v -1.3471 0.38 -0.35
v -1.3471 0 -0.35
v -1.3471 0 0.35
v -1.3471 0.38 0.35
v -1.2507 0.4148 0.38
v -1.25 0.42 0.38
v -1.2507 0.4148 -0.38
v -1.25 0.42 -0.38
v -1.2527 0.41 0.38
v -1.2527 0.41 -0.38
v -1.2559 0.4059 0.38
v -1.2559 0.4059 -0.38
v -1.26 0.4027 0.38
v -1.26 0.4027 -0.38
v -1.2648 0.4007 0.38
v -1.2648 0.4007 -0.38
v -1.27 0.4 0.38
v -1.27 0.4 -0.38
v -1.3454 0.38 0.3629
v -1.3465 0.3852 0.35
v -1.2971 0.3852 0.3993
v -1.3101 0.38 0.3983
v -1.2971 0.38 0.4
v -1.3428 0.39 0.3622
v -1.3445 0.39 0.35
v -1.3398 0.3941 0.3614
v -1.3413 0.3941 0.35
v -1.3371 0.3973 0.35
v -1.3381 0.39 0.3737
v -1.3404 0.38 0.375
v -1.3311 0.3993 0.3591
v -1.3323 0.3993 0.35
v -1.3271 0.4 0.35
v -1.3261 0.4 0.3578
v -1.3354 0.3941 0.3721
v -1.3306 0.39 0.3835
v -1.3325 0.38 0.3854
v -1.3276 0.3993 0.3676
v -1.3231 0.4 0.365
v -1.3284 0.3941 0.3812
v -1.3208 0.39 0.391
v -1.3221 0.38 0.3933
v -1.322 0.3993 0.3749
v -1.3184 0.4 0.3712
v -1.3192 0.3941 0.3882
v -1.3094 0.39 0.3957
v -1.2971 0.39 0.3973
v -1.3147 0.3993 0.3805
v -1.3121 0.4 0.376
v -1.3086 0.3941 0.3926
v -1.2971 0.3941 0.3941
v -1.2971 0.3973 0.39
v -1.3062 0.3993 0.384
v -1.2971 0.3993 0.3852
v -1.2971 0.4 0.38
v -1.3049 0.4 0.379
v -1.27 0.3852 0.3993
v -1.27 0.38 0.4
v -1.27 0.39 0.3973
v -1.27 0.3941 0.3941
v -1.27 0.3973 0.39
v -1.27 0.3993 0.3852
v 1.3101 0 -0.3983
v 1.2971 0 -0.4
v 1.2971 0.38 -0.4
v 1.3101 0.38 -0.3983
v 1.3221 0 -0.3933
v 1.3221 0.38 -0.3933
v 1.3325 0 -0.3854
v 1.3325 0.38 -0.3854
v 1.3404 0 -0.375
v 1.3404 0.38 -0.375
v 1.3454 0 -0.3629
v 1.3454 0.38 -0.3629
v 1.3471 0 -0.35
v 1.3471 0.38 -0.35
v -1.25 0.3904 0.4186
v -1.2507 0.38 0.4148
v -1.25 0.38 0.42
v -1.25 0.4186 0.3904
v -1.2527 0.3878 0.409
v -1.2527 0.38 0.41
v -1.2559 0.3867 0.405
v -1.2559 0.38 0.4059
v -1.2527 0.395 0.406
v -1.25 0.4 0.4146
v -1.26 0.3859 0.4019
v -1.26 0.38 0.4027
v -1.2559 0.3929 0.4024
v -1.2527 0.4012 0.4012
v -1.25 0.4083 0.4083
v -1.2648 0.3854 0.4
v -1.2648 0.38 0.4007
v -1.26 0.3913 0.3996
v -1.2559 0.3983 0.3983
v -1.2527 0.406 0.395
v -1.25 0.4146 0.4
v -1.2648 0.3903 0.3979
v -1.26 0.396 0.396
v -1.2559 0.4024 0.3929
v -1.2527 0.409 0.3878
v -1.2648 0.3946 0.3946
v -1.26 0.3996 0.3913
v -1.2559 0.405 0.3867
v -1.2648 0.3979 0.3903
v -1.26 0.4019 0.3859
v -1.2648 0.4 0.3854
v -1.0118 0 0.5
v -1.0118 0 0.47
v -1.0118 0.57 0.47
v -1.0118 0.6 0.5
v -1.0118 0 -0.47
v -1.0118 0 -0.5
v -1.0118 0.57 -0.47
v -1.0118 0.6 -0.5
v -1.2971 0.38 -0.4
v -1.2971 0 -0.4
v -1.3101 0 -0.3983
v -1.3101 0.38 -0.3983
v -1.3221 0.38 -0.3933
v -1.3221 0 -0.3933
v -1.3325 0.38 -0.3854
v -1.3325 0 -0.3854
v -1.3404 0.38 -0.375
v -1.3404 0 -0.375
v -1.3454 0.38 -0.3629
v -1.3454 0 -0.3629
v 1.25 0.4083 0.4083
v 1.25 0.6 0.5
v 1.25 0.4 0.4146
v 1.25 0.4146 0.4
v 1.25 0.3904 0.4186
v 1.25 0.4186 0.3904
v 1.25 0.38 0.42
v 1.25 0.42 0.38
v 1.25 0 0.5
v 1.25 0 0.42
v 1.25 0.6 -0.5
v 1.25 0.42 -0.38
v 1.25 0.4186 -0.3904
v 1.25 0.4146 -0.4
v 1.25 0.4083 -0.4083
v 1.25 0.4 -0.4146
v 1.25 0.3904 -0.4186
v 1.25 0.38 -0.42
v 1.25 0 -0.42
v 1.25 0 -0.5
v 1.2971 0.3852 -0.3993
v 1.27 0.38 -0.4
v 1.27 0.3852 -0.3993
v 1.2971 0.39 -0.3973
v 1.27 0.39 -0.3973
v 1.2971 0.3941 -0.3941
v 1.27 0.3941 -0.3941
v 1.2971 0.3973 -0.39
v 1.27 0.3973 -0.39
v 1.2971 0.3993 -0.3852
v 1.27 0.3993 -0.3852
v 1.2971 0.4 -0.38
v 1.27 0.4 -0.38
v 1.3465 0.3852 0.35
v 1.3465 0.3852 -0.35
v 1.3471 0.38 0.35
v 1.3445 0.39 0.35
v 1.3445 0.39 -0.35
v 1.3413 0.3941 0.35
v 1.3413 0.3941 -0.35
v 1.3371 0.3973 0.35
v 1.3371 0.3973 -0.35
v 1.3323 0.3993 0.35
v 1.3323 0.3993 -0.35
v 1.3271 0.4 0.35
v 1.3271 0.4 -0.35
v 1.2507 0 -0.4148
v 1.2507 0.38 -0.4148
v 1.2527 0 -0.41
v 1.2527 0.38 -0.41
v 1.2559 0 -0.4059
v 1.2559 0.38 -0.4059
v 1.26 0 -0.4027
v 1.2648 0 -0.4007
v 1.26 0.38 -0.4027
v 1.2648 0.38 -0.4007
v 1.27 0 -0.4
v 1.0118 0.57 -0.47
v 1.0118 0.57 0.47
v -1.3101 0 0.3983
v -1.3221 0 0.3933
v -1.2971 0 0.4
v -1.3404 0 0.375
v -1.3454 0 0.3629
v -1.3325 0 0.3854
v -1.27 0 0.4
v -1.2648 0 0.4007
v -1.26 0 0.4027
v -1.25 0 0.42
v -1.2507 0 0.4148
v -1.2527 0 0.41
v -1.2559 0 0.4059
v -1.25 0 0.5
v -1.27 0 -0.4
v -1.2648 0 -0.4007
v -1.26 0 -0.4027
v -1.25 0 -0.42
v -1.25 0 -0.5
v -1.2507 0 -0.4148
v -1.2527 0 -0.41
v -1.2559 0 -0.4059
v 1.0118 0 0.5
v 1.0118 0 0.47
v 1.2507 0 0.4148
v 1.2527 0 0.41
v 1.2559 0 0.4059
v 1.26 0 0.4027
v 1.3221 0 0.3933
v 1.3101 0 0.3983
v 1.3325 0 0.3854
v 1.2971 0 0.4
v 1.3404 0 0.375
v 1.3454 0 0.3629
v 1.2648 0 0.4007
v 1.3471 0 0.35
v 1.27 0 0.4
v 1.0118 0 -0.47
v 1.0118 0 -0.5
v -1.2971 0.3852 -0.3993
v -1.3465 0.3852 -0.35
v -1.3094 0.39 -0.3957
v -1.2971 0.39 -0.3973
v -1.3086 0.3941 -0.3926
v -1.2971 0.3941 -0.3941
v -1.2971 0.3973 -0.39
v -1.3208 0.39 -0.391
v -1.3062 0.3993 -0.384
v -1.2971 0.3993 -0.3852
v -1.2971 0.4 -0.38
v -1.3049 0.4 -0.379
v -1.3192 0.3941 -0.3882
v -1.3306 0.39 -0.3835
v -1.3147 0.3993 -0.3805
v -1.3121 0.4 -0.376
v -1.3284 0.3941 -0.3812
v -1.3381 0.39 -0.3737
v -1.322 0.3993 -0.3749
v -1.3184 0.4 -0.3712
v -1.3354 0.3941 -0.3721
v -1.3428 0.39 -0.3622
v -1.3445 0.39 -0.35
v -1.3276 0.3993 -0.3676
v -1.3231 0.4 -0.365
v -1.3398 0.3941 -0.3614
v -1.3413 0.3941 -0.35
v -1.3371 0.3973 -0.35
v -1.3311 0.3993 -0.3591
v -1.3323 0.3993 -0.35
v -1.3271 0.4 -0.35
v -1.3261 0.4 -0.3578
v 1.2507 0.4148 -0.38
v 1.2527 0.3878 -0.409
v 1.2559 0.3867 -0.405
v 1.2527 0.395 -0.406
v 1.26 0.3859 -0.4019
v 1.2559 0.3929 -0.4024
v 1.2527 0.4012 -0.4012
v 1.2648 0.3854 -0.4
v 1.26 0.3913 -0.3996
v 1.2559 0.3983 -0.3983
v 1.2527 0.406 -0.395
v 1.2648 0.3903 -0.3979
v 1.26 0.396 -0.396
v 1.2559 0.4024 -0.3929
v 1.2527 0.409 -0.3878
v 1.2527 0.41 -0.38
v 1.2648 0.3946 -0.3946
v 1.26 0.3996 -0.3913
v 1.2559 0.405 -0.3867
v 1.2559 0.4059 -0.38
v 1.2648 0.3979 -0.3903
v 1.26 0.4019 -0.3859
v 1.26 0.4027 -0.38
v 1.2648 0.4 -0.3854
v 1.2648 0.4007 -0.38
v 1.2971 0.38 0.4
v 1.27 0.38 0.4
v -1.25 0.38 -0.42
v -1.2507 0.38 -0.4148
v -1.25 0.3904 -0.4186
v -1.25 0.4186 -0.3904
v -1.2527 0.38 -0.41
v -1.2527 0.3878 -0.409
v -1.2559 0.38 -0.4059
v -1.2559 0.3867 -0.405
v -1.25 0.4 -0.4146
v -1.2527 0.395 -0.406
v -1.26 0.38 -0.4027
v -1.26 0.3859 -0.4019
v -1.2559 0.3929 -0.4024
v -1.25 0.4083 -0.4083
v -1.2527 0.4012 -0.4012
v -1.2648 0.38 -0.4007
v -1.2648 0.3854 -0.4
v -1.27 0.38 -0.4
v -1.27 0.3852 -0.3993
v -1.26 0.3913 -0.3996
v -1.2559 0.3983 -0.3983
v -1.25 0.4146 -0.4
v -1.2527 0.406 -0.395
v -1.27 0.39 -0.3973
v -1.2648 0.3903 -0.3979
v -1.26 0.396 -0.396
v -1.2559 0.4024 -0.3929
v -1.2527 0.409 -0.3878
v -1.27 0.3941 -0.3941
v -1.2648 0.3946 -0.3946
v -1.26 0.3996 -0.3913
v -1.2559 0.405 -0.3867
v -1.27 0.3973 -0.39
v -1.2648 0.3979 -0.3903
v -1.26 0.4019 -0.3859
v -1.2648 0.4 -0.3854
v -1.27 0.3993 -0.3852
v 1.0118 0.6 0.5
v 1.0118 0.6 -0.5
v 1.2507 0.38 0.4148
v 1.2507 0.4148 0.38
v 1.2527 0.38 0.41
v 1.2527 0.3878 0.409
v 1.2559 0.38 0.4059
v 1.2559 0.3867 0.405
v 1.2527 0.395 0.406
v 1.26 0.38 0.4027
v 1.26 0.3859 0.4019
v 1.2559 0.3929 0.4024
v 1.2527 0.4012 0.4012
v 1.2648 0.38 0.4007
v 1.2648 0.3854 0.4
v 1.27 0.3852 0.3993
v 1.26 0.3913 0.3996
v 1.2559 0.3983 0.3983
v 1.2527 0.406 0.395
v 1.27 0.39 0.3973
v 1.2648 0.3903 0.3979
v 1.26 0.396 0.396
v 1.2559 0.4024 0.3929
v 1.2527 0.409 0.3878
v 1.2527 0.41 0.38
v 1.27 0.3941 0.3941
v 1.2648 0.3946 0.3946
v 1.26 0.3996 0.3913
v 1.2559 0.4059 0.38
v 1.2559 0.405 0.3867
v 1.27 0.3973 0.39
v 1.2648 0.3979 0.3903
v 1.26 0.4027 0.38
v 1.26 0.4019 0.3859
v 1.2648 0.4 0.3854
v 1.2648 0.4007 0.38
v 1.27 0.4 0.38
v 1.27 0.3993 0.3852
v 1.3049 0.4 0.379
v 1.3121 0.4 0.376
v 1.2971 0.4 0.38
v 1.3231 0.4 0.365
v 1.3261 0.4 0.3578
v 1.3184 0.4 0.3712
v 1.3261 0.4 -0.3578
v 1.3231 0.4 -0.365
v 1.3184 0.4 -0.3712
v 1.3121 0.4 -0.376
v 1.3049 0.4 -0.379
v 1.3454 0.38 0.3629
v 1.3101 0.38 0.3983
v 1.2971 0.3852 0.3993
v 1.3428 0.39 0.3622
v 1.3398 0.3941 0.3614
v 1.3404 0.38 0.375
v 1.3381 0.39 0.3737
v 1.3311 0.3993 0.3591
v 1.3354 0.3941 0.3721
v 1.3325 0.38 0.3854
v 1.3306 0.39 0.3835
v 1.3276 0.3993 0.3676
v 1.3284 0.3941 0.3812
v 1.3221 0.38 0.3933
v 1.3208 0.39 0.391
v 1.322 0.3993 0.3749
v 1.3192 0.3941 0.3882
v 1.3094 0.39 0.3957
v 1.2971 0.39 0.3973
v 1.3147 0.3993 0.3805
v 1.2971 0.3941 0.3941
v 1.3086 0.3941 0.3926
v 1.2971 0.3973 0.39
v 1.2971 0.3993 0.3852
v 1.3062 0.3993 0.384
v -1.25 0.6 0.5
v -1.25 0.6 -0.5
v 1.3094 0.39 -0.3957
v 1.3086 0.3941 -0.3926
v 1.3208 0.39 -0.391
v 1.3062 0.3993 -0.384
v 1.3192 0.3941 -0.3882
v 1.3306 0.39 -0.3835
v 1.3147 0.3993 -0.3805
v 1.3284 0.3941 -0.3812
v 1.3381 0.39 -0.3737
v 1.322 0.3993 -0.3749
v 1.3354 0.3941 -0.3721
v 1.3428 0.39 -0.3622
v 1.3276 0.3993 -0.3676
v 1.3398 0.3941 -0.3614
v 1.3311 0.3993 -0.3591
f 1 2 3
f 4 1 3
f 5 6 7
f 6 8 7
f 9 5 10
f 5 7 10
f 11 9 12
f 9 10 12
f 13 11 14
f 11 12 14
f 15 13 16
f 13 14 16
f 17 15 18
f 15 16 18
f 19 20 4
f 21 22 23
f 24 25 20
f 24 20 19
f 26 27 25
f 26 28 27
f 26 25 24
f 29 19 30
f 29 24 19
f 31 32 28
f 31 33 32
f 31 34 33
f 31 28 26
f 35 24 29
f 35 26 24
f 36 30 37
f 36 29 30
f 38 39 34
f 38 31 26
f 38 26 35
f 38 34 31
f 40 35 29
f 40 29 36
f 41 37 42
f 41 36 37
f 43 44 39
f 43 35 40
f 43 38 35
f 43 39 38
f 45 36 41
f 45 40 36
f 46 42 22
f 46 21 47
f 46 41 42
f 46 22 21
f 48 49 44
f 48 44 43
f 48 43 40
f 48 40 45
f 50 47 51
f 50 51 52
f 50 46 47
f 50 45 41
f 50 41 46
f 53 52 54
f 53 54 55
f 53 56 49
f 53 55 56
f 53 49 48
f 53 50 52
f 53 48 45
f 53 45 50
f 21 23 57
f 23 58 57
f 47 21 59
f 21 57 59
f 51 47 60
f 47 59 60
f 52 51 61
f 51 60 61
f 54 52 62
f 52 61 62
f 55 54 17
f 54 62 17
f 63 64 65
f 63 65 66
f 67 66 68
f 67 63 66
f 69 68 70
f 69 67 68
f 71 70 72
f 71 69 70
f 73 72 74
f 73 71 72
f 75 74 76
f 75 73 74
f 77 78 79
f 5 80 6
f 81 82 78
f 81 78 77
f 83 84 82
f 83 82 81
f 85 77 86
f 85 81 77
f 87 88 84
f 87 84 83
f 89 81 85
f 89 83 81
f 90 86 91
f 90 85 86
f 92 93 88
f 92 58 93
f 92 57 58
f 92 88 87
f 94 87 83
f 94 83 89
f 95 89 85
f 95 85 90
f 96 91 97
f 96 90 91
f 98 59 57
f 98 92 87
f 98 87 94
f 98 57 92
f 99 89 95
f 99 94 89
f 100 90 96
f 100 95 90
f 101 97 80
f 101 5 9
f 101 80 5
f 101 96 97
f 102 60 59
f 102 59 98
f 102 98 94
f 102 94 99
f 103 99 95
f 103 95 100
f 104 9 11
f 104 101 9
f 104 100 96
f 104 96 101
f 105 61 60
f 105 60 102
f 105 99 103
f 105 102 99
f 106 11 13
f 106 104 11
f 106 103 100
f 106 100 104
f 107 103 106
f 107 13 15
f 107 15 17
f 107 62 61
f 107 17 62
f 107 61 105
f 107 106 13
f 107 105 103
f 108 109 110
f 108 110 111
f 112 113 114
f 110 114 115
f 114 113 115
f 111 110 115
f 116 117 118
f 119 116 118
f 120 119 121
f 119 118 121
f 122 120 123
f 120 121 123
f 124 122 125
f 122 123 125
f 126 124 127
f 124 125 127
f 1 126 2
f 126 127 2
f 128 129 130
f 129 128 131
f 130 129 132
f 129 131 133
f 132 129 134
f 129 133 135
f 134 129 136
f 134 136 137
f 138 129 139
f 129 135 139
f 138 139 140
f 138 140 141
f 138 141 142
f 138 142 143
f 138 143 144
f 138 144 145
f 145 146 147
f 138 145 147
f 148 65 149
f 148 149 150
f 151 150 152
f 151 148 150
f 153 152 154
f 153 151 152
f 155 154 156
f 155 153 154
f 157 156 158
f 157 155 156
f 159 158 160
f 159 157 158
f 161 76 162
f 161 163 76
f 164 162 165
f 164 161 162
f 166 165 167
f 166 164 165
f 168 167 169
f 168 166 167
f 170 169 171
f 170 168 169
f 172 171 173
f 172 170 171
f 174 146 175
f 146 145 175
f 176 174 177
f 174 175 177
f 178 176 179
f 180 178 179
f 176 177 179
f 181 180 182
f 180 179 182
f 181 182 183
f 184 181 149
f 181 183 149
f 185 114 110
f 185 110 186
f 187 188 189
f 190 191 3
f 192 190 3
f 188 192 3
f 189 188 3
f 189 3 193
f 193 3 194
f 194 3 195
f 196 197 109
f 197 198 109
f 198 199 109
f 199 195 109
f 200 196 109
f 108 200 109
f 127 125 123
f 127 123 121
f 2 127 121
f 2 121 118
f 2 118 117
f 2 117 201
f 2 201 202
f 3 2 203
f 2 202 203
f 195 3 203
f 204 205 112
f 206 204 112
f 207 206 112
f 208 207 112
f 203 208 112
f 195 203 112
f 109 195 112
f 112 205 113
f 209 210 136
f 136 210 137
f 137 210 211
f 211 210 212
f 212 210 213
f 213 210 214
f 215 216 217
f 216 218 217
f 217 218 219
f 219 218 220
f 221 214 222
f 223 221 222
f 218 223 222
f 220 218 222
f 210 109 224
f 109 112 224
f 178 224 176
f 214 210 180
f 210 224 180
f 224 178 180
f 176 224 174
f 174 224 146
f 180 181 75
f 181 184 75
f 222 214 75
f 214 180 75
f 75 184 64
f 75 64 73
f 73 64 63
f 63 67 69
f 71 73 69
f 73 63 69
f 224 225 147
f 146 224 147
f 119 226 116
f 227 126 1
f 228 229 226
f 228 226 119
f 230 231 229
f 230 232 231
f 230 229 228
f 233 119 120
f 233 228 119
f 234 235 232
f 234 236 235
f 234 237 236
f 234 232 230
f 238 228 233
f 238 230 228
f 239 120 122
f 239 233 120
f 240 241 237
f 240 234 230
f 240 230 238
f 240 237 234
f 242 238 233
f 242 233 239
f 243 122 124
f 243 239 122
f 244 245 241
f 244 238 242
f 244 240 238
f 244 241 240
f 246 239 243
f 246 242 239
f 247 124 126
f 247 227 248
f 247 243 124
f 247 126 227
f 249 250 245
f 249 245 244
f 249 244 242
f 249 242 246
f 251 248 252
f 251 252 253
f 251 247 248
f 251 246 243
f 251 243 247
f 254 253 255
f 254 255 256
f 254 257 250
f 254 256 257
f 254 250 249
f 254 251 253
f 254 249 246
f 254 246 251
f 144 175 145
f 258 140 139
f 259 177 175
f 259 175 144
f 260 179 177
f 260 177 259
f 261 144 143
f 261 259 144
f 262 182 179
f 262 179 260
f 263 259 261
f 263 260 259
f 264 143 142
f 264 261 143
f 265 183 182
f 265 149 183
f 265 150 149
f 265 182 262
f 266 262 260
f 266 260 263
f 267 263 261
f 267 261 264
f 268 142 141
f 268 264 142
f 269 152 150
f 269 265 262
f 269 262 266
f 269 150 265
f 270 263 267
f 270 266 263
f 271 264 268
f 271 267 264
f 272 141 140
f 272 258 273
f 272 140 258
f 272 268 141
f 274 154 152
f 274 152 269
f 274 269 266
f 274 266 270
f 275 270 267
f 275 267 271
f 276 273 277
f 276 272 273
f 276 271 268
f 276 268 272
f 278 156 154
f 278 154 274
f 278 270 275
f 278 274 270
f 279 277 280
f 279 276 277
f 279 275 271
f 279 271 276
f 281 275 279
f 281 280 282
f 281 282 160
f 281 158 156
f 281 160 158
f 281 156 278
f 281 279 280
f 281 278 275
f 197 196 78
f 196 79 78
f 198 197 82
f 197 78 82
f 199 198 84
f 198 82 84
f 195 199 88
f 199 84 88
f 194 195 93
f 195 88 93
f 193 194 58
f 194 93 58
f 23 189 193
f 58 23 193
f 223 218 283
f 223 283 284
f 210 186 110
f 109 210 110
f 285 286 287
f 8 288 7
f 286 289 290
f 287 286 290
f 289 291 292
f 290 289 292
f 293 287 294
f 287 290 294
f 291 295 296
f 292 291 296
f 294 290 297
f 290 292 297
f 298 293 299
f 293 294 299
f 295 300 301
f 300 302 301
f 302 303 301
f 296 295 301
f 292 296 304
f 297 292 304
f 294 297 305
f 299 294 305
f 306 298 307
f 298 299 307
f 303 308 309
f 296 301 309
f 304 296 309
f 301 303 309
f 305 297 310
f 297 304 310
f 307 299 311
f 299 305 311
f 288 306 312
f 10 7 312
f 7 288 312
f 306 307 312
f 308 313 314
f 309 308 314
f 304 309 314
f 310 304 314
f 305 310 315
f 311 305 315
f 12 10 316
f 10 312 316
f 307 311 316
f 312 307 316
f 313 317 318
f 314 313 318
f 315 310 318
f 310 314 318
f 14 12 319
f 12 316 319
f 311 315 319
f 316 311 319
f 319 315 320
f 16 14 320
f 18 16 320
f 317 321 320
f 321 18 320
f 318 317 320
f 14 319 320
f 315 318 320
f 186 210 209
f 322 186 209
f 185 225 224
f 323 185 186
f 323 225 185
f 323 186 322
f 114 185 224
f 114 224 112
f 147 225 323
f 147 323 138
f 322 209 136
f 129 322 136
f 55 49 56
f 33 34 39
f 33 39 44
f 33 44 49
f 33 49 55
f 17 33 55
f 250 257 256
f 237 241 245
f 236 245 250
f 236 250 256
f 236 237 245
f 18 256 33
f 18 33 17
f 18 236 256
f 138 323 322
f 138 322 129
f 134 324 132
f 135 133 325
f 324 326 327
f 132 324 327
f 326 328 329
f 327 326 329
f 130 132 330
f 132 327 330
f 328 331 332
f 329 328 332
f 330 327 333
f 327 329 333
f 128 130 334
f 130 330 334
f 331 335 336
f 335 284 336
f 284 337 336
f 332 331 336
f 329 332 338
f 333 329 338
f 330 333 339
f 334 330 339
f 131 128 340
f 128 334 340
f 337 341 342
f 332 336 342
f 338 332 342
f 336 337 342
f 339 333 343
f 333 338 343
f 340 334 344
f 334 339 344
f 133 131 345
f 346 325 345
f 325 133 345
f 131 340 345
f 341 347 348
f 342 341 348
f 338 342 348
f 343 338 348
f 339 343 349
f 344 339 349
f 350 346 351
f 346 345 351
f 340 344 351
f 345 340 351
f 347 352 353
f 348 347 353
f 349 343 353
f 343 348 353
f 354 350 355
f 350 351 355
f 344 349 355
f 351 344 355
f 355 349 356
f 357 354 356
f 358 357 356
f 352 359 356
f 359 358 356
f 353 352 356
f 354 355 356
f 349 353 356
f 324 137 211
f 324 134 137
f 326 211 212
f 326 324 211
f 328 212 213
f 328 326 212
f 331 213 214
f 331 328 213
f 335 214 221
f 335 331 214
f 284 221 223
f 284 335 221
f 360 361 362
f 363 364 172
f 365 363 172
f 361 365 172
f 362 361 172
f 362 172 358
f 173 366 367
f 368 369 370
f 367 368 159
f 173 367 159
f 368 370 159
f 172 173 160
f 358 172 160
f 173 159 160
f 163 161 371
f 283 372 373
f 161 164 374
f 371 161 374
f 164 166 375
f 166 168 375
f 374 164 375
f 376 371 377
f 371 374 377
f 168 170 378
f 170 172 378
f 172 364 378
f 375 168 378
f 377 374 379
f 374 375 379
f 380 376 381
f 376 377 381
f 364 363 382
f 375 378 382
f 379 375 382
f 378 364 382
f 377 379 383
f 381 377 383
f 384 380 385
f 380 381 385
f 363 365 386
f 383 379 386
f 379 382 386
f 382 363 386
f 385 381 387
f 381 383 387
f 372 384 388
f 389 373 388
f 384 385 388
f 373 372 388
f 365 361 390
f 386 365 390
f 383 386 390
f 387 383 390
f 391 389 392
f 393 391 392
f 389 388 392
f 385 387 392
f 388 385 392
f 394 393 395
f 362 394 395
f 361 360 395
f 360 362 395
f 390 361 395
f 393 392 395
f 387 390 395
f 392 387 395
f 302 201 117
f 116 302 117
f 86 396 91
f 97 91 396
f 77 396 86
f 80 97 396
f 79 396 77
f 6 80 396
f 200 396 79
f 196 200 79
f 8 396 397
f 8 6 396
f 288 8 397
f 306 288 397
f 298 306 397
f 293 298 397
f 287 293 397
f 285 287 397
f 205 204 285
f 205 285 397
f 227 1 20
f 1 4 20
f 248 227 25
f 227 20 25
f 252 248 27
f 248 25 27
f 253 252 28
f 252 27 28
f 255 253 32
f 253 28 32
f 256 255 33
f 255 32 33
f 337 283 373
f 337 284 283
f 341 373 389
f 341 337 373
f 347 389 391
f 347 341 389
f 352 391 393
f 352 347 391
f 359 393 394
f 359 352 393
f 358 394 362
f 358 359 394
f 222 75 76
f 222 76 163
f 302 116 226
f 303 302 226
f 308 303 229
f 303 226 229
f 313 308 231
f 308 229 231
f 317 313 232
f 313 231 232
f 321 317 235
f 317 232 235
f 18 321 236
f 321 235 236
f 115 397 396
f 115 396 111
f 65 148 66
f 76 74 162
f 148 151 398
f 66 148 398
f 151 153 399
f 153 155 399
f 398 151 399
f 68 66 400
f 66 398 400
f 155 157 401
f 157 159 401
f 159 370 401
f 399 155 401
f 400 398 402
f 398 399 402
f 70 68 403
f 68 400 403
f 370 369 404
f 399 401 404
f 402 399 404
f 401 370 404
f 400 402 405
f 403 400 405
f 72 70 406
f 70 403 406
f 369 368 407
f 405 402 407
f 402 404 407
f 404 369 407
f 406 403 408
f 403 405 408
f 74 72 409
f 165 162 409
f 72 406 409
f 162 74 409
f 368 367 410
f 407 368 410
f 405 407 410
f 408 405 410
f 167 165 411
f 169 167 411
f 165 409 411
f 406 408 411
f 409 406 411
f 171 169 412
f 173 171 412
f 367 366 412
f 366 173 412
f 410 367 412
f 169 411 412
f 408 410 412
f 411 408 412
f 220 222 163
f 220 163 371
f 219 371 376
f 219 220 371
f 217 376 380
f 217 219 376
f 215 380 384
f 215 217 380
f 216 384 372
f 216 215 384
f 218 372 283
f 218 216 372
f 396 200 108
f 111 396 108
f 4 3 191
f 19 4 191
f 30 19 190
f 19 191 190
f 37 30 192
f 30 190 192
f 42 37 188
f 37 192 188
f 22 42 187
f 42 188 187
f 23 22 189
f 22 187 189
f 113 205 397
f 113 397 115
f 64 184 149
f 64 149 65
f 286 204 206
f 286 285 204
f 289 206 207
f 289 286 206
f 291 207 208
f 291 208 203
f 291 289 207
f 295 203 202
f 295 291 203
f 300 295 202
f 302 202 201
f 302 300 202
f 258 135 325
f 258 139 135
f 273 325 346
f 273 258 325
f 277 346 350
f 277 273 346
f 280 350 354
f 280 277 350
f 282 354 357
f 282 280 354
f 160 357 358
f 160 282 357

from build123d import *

# Parameters (mm, degrees)
ESQUISSE1_W             = 2.5
ESQUISSE1_H             = 1
BOSS_EXTRU_1_DEPTH      = 0.6
ESQUISSE2_W             = 2.023603034
ESQUISSE2_H             = 1
ENL_V_MAT_EXTRU_1_DEPTH = 0.03
BOSS_EXTRU_2_DEPTH      = 0.4
CONG_1_R                = 0.02
CONG_1_OF_SYM_TRIE2_R   = 0.02
ESQUISSE5_W             = 2.023603034
ESQUISSE5_H             = 0.57
ENL_V_MAT_EXTRU_2_DEPTH = 0.03


with BuildPart() as part:
    # Esquisse1 → Boss.-Extru.1 (new body)
    with BuildSketch(Plane(origin=(0, 0, 0), x_dir=(1, 0, 0), z_dir=(0, 1, 0))):
        Rectangle(ESQUISSE1_W, ESQUISSE1_H)
    extrude(amount=BOSS_EXTRU_1_DEPTH)

    # Esquisse2 → Enlèv. mat.-Extru.1 (cut)
    with BuildSketch(Plane(origin=(0, 0.6, 0), x_dir=(1, 0, 0), z_dir=(0, 1, 0))):
        Rectangle(ESQUISSE2_W, ESQUISSE2_H)
    extrude(amount=-ENL_V_MAT_EXTRU_1_DEPTH, mode=Mode.SUBTRACT)

    # Esquisse3 → Boss.-Extru.2 (add)
    with BuildSketch(Plane(origin=(0, 0, 0), x_dir=(1, 0, 0), z_dir=(0, 1, 0))):
        with BuildLine():
            Line((1.25, 0.4), (1.297141448, 0.4))
            ThreePointArc((1.297141448, 0.4), (1.332496787, 0.385355339), (1.347141448, 0.35))
            Line((1.347141448, 0.35), (1.347141448, -0.35))
            ThreePointArc((1.347141448, -0.35), (1.332496787, -0.385355339), (1.297141448, -0.4))
            Line((1.297141448, -0.4), (1.25, -0.4))
            Line((1.25, -0.4), (1.25, 0.4))
        make_face()
    boss_extru_2 = extrude(amount=BOSS_EXTRU_2_DEPTH)

    # Congé1
    cong_1_edges = [part.edges().sort_by_distance(p)[0] for p in [
        (1.25, 0.2, -0.4),
        (1.25, 0.2, 0.4),
        (1.25, 0.4, 0),
        (1.273570724, 0.4, 0.4),
        (1.332496787, 0.4, 0.385355339),
        (1.347141448, 0.4, 0),
        (1.332496787, 0.4, -0.385355339),
        (1.273570724, 0.4, -0.4),
    ]]
    fillet(cong_1_edges, radius=CONG_1_R)

    # Symétrie2: Boss.-Extru.2 across plane
    add(boss_extru_2.mirror(Plane(origin=(0, 0, 0), x_dir=(0, 0, 1), z_dir=(1, 0, 0))))

    # Congé1 of Symétrie2
    cong_1_of_sym_trie2_edges = [part.edges().sort_by_distance(p)[0] for p in [
        (-1.25, 0.2, -0.4),
        (-1.25, 0.2, 0.4),
        (-1.25, 0.4, 0),
        (-1.273570724, 0.4, 0.4),
        (-1.332496787, 0.4, 0.385355339),
        (-1.347141448, 0.4, 0),
        (-1.332496787, 0.4, -0.385355339),
        (-1.273570724, 0.4, -0.4),
    ]]
    fillet(cong_1_of_sym_trie2_edges, radius=CONG_1_OF_SYM_TRIE2_R)

    # Esquisse5 → Enlèv. mat.-Extru.2 (cut)
    with BuildSketch(Plane(origin=(0, 0, -0.5), x_dir=(-1, 0, 0), z_dir=(0, 0, -1))):
        with Locations((0, 0.285)):
            Rectangle(ESQUISSE5_W, ESQUISSE5_H)
    enl_v_mat_extru_2 = extrude(amount=-ENL_V_MAT_EXTRU_2_DEPTH, mode=Mode.SUBTRACT)

    # Symétrie3: Enlèv. mat.-Extru.2 across plane
    add(enl_v_mat_extru_2.mirror(Plane.XY), mode=Mode.SUBTRACT)


solid = part.part
